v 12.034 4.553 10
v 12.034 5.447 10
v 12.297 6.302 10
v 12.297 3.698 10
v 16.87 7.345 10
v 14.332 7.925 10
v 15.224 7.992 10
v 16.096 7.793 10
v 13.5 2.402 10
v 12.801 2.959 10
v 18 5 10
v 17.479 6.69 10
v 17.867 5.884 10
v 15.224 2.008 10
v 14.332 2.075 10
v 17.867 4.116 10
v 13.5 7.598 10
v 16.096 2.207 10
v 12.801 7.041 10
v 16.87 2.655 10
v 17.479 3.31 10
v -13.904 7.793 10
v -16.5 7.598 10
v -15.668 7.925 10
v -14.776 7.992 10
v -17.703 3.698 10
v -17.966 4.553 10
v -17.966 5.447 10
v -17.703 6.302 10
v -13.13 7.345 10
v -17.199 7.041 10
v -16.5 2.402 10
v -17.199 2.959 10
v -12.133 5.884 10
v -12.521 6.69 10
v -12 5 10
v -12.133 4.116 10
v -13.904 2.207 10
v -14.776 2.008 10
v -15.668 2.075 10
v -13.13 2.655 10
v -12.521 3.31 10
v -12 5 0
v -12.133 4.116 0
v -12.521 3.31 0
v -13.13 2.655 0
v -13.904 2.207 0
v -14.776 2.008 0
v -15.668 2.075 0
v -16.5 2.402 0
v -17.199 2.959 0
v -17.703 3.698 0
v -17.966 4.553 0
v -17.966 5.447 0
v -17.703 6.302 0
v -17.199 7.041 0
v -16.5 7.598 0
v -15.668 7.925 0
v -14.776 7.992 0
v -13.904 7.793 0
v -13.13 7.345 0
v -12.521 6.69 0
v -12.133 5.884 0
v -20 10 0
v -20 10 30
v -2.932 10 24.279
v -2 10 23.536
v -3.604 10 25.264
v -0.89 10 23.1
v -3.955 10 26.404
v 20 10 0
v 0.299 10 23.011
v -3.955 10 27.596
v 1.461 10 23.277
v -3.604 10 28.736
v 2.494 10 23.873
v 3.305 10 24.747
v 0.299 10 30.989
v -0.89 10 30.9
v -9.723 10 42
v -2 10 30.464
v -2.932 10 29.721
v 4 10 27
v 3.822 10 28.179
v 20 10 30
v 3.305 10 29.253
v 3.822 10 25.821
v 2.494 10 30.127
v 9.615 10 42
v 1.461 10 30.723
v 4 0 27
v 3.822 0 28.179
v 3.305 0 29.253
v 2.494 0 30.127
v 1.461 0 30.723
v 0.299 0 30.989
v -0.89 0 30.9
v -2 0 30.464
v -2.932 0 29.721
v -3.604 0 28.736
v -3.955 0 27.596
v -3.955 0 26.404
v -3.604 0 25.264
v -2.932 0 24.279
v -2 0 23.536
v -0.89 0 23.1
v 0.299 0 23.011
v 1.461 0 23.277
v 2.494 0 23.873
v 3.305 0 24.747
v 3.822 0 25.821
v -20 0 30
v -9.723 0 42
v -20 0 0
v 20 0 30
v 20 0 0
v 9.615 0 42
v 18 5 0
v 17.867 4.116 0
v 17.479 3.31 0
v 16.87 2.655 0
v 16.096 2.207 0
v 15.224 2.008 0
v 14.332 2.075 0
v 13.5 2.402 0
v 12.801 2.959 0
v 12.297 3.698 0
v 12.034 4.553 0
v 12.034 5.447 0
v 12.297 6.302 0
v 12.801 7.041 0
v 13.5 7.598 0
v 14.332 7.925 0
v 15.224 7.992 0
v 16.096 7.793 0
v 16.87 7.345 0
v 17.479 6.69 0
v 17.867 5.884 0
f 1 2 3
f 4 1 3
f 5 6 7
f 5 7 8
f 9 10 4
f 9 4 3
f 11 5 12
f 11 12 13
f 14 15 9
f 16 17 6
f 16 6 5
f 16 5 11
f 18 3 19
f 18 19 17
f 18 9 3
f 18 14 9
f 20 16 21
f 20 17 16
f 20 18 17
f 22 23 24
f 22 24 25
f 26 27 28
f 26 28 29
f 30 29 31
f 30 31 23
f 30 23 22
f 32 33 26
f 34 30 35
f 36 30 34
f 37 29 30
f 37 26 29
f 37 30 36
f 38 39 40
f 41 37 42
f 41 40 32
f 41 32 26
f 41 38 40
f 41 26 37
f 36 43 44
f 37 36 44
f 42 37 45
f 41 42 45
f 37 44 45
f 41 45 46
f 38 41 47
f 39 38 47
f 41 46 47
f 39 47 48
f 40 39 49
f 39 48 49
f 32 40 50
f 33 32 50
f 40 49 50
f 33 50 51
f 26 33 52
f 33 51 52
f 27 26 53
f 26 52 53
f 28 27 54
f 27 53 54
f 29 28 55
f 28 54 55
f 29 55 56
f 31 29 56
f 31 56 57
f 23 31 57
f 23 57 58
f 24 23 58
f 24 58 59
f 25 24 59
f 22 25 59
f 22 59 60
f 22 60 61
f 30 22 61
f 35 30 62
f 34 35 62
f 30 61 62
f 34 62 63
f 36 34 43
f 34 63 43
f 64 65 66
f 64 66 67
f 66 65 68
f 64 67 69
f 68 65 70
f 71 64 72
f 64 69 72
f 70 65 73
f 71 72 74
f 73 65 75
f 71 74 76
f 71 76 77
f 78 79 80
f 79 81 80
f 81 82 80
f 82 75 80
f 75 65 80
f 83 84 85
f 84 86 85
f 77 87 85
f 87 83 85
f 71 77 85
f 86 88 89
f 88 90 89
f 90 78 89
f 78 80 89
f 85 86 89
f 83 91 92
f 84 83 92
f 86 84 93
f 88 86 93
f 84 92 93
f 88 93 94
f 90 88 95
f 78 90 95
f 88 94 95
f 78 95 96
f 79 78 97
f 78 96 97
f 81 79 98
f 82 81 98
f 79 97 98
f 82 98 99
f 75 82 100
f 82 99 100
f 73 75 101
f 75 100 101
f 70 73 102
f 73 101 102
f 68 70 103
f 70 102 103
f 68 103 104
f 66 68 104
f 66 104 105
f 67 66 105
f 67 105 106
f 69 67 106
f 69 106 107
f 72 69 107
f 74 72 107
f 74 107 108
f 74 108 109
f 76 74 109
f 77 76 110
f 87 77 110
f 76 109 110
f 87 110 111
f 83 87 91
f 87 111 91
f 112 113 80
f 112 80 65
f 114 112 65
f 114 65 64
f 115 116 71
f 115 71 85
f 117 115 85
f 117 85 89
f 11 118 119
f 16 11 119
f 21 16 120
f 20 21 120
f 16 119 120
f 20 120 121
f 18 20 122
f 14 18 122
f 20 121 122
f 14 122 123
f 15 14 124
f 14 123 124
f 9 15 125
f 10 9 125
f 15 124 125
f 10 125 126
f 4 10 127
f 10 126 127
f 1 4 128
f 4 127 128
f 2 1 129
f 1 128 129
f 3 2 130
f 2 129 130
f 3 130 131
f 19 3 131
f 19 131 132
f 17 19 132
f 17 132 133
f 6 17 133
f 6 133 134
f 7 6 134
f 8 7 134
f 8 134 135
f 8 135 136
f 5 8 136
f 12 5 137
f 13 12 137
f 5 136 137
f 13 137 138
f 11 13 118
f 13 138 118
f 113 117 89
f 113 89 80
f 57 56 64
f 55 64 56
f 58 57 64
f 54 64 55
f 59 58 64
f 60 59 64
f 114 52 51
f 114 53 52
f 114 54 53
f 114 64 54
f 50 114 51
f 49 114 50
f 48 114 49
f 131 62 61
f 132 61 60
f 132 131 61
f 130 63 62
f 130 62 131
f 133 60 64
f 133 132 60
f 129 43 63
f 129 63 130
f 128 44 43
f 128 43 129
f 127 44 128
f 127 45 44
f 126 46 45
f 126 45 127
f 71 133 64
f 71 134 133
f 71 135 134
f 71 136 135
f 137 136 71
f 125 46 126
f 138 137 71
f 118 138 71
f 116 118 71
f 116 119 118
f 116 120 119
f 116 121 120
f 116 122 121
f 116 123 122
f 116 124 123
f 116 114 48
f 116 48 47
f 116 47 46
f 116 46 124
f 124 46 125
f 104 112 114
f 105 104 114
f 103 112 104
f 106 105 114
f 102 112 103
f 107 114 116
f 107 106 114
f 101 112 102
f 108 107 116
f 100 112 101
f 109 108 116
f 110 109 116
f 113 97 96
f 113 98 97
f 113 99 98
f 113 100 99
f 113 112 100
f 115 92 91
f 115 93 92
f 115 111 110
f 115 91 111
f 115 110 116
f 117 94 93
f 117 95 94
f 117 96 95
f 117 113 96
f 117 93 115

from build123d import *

# Parameters (mm, degrees)
F0_R     = 4
F1_DEPTH = 10
F2_R     = 3
F3_DEPTH = 10


with BuildPart() as f1:
    # F0 (on Front) → F1 (new body)
    with BuildSketch(Plane.XZ):
        Polygon((-20, 30), (-20, 0), (20, 0), (20, 30), (9.614969, 42), (-9.72316, 42), align=None)
        with Locations((0, 27)):
            Circle(F0_R, mode=Mode.SUBTRACT)
    extrude(amount=-F1_DEPTH)

    # F2 (on face) → F3 (cut)
    with BuildSketch(Plane(origin=(0, 0, 0), x_dir=(1, 0, 0), z_dir=(0, 0, -1))):
        with Locations((-15, -5)):
            Circle(F2_R)
        with Locations((15, -5)):
            Circle(F2_R)
    extrude(amount=-F3_DEPTH, mode=Mode.SUBTRACT)


solid = f1.part
